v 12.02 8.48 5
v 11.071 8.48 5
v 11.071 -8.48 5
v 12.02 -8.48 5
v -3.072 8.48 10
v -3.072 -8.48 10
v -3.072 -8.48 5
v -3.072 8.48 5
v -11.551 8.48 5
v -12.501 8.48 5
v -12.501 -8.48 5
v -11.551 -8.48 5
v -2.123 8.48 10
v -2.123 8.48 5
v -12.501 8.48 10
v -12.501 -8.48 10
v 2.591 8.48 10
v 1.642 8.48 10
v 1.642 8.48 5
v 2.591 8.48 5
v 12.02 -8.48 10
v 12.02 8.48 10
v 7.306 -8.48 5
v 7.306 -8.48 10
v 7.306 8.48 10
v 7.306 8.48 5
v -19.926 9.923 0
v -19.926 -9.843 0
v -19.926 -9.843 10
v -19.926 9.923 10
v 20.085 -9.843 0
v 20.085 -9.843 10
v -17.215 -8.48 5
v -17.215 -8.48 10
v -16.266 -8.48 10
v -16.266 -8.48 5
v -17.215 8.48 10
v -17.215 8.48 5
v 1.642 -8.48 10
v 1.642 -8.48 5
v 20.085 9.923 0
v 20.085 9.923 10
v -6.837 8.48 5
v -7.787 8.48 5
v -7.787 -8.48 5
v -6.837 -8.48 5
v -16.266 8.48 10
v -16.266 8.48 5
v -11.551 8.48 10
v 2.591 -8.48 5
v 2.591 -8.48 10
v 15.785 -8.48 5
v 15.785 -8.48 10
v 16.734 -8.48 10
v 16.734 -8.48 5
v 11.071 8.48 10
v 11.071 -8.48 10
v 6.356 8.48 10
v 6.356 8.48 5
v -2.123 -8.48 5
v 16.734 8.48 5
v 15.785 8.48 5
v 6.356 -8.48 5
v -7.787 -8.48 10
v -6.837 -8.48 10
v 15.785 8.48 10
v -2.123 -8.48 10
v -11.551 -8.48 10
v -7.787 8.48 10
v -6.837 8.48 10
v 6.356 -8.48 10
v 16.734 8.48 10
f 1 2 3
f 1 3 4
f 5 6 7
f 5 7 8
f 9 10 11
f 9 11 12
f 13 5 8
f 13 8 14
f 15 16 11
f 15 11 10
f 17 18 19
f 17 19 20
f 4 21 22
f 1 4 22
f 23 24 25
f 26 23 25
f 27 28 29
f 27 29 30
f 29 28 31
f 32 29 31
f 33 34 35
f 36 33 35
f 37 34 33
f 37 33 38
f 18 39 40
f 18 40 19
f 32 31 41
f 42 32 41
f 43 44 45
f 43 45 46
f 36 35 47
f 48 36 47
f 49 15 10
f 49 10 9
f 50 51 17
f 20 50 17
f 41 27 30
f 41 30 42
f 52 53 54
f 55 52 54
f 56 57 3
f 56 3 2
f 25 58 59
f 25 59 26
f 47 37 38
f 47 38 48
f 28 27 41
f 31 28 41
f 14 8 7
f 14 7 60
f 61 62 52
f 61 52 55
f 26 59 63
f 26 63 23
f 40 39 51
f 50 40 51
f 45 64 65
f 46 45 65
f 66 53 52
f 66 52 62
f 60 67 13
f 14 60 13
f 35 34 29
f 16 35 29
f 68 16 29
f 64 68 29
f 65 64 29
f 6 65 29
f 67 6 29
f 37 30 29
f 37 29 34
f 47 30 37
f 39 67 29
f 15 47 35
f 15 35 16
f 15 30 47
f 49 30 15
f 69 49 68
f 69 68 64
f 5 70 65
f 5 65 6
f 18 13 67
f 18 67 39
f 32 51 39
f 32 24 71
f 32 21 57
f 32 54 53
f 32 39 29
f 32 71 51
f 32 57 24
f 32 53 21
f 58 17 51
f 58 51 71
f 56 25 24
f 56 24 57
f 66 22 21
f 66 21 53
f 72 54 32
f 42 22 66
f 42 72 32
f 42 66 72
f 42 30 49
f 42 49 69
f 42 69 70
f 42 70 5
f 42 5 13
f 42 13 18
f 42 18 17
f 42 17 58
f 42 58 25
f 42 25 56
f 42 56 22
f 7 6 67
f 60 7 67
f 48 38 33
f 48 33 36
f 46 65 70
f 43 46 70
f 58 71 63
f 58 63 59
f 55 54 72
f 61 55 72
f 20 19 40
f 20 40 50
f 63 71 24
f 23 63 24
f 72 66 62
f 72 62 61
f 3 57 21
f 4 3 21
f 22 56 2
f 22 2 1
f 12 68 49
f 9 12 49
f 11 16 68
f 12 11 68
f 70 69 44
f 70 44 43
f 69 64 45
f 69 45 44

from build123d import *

# Parameters (mm, degrees)
SKETCH_W            = 40.010176
SKETCH_H            = 19.766459
PAD_DEPTH           = 10
SKETCH001_W         = 0.949318
SKETCH001_H         = 16.960248
POCKET_DEPTH        = 5
LINEARPATTERN_COUNT = 8
LINEARPATTERN_PITCH = 4.714286


with BuildPart() as part:
    # Sketch → Pad (new body)
    with BuildSketch(Plane.XY):
        with Locations((0.079543, 0.039771)):
            Rectangle(SKETCH_W, SKETCH_H)
    extrude(amount=PAD_DEPTH)

    # Sketch001 (on Face6 of Pad) → Pocket (cut)
    with BuildSketch(Plane.XY.offset(10)):
        with Locations((-16.740425, 0)):
            Rectangle(SKETCH001_W, SKETCH001_H)
    pocket = extrude(amount=-POCKET_DEPTH, mode=Mode.SUBTRACT)

    # LinearPattern: Pocket ×8
    with Locations(*[(i * LINEARPATTERN_PITCH, 0, 0) for i in range(1, LINEARPATTERN_COUNT)]):
        add(pocket, mode=Mode.SUBTRACT)


solid = part.part
